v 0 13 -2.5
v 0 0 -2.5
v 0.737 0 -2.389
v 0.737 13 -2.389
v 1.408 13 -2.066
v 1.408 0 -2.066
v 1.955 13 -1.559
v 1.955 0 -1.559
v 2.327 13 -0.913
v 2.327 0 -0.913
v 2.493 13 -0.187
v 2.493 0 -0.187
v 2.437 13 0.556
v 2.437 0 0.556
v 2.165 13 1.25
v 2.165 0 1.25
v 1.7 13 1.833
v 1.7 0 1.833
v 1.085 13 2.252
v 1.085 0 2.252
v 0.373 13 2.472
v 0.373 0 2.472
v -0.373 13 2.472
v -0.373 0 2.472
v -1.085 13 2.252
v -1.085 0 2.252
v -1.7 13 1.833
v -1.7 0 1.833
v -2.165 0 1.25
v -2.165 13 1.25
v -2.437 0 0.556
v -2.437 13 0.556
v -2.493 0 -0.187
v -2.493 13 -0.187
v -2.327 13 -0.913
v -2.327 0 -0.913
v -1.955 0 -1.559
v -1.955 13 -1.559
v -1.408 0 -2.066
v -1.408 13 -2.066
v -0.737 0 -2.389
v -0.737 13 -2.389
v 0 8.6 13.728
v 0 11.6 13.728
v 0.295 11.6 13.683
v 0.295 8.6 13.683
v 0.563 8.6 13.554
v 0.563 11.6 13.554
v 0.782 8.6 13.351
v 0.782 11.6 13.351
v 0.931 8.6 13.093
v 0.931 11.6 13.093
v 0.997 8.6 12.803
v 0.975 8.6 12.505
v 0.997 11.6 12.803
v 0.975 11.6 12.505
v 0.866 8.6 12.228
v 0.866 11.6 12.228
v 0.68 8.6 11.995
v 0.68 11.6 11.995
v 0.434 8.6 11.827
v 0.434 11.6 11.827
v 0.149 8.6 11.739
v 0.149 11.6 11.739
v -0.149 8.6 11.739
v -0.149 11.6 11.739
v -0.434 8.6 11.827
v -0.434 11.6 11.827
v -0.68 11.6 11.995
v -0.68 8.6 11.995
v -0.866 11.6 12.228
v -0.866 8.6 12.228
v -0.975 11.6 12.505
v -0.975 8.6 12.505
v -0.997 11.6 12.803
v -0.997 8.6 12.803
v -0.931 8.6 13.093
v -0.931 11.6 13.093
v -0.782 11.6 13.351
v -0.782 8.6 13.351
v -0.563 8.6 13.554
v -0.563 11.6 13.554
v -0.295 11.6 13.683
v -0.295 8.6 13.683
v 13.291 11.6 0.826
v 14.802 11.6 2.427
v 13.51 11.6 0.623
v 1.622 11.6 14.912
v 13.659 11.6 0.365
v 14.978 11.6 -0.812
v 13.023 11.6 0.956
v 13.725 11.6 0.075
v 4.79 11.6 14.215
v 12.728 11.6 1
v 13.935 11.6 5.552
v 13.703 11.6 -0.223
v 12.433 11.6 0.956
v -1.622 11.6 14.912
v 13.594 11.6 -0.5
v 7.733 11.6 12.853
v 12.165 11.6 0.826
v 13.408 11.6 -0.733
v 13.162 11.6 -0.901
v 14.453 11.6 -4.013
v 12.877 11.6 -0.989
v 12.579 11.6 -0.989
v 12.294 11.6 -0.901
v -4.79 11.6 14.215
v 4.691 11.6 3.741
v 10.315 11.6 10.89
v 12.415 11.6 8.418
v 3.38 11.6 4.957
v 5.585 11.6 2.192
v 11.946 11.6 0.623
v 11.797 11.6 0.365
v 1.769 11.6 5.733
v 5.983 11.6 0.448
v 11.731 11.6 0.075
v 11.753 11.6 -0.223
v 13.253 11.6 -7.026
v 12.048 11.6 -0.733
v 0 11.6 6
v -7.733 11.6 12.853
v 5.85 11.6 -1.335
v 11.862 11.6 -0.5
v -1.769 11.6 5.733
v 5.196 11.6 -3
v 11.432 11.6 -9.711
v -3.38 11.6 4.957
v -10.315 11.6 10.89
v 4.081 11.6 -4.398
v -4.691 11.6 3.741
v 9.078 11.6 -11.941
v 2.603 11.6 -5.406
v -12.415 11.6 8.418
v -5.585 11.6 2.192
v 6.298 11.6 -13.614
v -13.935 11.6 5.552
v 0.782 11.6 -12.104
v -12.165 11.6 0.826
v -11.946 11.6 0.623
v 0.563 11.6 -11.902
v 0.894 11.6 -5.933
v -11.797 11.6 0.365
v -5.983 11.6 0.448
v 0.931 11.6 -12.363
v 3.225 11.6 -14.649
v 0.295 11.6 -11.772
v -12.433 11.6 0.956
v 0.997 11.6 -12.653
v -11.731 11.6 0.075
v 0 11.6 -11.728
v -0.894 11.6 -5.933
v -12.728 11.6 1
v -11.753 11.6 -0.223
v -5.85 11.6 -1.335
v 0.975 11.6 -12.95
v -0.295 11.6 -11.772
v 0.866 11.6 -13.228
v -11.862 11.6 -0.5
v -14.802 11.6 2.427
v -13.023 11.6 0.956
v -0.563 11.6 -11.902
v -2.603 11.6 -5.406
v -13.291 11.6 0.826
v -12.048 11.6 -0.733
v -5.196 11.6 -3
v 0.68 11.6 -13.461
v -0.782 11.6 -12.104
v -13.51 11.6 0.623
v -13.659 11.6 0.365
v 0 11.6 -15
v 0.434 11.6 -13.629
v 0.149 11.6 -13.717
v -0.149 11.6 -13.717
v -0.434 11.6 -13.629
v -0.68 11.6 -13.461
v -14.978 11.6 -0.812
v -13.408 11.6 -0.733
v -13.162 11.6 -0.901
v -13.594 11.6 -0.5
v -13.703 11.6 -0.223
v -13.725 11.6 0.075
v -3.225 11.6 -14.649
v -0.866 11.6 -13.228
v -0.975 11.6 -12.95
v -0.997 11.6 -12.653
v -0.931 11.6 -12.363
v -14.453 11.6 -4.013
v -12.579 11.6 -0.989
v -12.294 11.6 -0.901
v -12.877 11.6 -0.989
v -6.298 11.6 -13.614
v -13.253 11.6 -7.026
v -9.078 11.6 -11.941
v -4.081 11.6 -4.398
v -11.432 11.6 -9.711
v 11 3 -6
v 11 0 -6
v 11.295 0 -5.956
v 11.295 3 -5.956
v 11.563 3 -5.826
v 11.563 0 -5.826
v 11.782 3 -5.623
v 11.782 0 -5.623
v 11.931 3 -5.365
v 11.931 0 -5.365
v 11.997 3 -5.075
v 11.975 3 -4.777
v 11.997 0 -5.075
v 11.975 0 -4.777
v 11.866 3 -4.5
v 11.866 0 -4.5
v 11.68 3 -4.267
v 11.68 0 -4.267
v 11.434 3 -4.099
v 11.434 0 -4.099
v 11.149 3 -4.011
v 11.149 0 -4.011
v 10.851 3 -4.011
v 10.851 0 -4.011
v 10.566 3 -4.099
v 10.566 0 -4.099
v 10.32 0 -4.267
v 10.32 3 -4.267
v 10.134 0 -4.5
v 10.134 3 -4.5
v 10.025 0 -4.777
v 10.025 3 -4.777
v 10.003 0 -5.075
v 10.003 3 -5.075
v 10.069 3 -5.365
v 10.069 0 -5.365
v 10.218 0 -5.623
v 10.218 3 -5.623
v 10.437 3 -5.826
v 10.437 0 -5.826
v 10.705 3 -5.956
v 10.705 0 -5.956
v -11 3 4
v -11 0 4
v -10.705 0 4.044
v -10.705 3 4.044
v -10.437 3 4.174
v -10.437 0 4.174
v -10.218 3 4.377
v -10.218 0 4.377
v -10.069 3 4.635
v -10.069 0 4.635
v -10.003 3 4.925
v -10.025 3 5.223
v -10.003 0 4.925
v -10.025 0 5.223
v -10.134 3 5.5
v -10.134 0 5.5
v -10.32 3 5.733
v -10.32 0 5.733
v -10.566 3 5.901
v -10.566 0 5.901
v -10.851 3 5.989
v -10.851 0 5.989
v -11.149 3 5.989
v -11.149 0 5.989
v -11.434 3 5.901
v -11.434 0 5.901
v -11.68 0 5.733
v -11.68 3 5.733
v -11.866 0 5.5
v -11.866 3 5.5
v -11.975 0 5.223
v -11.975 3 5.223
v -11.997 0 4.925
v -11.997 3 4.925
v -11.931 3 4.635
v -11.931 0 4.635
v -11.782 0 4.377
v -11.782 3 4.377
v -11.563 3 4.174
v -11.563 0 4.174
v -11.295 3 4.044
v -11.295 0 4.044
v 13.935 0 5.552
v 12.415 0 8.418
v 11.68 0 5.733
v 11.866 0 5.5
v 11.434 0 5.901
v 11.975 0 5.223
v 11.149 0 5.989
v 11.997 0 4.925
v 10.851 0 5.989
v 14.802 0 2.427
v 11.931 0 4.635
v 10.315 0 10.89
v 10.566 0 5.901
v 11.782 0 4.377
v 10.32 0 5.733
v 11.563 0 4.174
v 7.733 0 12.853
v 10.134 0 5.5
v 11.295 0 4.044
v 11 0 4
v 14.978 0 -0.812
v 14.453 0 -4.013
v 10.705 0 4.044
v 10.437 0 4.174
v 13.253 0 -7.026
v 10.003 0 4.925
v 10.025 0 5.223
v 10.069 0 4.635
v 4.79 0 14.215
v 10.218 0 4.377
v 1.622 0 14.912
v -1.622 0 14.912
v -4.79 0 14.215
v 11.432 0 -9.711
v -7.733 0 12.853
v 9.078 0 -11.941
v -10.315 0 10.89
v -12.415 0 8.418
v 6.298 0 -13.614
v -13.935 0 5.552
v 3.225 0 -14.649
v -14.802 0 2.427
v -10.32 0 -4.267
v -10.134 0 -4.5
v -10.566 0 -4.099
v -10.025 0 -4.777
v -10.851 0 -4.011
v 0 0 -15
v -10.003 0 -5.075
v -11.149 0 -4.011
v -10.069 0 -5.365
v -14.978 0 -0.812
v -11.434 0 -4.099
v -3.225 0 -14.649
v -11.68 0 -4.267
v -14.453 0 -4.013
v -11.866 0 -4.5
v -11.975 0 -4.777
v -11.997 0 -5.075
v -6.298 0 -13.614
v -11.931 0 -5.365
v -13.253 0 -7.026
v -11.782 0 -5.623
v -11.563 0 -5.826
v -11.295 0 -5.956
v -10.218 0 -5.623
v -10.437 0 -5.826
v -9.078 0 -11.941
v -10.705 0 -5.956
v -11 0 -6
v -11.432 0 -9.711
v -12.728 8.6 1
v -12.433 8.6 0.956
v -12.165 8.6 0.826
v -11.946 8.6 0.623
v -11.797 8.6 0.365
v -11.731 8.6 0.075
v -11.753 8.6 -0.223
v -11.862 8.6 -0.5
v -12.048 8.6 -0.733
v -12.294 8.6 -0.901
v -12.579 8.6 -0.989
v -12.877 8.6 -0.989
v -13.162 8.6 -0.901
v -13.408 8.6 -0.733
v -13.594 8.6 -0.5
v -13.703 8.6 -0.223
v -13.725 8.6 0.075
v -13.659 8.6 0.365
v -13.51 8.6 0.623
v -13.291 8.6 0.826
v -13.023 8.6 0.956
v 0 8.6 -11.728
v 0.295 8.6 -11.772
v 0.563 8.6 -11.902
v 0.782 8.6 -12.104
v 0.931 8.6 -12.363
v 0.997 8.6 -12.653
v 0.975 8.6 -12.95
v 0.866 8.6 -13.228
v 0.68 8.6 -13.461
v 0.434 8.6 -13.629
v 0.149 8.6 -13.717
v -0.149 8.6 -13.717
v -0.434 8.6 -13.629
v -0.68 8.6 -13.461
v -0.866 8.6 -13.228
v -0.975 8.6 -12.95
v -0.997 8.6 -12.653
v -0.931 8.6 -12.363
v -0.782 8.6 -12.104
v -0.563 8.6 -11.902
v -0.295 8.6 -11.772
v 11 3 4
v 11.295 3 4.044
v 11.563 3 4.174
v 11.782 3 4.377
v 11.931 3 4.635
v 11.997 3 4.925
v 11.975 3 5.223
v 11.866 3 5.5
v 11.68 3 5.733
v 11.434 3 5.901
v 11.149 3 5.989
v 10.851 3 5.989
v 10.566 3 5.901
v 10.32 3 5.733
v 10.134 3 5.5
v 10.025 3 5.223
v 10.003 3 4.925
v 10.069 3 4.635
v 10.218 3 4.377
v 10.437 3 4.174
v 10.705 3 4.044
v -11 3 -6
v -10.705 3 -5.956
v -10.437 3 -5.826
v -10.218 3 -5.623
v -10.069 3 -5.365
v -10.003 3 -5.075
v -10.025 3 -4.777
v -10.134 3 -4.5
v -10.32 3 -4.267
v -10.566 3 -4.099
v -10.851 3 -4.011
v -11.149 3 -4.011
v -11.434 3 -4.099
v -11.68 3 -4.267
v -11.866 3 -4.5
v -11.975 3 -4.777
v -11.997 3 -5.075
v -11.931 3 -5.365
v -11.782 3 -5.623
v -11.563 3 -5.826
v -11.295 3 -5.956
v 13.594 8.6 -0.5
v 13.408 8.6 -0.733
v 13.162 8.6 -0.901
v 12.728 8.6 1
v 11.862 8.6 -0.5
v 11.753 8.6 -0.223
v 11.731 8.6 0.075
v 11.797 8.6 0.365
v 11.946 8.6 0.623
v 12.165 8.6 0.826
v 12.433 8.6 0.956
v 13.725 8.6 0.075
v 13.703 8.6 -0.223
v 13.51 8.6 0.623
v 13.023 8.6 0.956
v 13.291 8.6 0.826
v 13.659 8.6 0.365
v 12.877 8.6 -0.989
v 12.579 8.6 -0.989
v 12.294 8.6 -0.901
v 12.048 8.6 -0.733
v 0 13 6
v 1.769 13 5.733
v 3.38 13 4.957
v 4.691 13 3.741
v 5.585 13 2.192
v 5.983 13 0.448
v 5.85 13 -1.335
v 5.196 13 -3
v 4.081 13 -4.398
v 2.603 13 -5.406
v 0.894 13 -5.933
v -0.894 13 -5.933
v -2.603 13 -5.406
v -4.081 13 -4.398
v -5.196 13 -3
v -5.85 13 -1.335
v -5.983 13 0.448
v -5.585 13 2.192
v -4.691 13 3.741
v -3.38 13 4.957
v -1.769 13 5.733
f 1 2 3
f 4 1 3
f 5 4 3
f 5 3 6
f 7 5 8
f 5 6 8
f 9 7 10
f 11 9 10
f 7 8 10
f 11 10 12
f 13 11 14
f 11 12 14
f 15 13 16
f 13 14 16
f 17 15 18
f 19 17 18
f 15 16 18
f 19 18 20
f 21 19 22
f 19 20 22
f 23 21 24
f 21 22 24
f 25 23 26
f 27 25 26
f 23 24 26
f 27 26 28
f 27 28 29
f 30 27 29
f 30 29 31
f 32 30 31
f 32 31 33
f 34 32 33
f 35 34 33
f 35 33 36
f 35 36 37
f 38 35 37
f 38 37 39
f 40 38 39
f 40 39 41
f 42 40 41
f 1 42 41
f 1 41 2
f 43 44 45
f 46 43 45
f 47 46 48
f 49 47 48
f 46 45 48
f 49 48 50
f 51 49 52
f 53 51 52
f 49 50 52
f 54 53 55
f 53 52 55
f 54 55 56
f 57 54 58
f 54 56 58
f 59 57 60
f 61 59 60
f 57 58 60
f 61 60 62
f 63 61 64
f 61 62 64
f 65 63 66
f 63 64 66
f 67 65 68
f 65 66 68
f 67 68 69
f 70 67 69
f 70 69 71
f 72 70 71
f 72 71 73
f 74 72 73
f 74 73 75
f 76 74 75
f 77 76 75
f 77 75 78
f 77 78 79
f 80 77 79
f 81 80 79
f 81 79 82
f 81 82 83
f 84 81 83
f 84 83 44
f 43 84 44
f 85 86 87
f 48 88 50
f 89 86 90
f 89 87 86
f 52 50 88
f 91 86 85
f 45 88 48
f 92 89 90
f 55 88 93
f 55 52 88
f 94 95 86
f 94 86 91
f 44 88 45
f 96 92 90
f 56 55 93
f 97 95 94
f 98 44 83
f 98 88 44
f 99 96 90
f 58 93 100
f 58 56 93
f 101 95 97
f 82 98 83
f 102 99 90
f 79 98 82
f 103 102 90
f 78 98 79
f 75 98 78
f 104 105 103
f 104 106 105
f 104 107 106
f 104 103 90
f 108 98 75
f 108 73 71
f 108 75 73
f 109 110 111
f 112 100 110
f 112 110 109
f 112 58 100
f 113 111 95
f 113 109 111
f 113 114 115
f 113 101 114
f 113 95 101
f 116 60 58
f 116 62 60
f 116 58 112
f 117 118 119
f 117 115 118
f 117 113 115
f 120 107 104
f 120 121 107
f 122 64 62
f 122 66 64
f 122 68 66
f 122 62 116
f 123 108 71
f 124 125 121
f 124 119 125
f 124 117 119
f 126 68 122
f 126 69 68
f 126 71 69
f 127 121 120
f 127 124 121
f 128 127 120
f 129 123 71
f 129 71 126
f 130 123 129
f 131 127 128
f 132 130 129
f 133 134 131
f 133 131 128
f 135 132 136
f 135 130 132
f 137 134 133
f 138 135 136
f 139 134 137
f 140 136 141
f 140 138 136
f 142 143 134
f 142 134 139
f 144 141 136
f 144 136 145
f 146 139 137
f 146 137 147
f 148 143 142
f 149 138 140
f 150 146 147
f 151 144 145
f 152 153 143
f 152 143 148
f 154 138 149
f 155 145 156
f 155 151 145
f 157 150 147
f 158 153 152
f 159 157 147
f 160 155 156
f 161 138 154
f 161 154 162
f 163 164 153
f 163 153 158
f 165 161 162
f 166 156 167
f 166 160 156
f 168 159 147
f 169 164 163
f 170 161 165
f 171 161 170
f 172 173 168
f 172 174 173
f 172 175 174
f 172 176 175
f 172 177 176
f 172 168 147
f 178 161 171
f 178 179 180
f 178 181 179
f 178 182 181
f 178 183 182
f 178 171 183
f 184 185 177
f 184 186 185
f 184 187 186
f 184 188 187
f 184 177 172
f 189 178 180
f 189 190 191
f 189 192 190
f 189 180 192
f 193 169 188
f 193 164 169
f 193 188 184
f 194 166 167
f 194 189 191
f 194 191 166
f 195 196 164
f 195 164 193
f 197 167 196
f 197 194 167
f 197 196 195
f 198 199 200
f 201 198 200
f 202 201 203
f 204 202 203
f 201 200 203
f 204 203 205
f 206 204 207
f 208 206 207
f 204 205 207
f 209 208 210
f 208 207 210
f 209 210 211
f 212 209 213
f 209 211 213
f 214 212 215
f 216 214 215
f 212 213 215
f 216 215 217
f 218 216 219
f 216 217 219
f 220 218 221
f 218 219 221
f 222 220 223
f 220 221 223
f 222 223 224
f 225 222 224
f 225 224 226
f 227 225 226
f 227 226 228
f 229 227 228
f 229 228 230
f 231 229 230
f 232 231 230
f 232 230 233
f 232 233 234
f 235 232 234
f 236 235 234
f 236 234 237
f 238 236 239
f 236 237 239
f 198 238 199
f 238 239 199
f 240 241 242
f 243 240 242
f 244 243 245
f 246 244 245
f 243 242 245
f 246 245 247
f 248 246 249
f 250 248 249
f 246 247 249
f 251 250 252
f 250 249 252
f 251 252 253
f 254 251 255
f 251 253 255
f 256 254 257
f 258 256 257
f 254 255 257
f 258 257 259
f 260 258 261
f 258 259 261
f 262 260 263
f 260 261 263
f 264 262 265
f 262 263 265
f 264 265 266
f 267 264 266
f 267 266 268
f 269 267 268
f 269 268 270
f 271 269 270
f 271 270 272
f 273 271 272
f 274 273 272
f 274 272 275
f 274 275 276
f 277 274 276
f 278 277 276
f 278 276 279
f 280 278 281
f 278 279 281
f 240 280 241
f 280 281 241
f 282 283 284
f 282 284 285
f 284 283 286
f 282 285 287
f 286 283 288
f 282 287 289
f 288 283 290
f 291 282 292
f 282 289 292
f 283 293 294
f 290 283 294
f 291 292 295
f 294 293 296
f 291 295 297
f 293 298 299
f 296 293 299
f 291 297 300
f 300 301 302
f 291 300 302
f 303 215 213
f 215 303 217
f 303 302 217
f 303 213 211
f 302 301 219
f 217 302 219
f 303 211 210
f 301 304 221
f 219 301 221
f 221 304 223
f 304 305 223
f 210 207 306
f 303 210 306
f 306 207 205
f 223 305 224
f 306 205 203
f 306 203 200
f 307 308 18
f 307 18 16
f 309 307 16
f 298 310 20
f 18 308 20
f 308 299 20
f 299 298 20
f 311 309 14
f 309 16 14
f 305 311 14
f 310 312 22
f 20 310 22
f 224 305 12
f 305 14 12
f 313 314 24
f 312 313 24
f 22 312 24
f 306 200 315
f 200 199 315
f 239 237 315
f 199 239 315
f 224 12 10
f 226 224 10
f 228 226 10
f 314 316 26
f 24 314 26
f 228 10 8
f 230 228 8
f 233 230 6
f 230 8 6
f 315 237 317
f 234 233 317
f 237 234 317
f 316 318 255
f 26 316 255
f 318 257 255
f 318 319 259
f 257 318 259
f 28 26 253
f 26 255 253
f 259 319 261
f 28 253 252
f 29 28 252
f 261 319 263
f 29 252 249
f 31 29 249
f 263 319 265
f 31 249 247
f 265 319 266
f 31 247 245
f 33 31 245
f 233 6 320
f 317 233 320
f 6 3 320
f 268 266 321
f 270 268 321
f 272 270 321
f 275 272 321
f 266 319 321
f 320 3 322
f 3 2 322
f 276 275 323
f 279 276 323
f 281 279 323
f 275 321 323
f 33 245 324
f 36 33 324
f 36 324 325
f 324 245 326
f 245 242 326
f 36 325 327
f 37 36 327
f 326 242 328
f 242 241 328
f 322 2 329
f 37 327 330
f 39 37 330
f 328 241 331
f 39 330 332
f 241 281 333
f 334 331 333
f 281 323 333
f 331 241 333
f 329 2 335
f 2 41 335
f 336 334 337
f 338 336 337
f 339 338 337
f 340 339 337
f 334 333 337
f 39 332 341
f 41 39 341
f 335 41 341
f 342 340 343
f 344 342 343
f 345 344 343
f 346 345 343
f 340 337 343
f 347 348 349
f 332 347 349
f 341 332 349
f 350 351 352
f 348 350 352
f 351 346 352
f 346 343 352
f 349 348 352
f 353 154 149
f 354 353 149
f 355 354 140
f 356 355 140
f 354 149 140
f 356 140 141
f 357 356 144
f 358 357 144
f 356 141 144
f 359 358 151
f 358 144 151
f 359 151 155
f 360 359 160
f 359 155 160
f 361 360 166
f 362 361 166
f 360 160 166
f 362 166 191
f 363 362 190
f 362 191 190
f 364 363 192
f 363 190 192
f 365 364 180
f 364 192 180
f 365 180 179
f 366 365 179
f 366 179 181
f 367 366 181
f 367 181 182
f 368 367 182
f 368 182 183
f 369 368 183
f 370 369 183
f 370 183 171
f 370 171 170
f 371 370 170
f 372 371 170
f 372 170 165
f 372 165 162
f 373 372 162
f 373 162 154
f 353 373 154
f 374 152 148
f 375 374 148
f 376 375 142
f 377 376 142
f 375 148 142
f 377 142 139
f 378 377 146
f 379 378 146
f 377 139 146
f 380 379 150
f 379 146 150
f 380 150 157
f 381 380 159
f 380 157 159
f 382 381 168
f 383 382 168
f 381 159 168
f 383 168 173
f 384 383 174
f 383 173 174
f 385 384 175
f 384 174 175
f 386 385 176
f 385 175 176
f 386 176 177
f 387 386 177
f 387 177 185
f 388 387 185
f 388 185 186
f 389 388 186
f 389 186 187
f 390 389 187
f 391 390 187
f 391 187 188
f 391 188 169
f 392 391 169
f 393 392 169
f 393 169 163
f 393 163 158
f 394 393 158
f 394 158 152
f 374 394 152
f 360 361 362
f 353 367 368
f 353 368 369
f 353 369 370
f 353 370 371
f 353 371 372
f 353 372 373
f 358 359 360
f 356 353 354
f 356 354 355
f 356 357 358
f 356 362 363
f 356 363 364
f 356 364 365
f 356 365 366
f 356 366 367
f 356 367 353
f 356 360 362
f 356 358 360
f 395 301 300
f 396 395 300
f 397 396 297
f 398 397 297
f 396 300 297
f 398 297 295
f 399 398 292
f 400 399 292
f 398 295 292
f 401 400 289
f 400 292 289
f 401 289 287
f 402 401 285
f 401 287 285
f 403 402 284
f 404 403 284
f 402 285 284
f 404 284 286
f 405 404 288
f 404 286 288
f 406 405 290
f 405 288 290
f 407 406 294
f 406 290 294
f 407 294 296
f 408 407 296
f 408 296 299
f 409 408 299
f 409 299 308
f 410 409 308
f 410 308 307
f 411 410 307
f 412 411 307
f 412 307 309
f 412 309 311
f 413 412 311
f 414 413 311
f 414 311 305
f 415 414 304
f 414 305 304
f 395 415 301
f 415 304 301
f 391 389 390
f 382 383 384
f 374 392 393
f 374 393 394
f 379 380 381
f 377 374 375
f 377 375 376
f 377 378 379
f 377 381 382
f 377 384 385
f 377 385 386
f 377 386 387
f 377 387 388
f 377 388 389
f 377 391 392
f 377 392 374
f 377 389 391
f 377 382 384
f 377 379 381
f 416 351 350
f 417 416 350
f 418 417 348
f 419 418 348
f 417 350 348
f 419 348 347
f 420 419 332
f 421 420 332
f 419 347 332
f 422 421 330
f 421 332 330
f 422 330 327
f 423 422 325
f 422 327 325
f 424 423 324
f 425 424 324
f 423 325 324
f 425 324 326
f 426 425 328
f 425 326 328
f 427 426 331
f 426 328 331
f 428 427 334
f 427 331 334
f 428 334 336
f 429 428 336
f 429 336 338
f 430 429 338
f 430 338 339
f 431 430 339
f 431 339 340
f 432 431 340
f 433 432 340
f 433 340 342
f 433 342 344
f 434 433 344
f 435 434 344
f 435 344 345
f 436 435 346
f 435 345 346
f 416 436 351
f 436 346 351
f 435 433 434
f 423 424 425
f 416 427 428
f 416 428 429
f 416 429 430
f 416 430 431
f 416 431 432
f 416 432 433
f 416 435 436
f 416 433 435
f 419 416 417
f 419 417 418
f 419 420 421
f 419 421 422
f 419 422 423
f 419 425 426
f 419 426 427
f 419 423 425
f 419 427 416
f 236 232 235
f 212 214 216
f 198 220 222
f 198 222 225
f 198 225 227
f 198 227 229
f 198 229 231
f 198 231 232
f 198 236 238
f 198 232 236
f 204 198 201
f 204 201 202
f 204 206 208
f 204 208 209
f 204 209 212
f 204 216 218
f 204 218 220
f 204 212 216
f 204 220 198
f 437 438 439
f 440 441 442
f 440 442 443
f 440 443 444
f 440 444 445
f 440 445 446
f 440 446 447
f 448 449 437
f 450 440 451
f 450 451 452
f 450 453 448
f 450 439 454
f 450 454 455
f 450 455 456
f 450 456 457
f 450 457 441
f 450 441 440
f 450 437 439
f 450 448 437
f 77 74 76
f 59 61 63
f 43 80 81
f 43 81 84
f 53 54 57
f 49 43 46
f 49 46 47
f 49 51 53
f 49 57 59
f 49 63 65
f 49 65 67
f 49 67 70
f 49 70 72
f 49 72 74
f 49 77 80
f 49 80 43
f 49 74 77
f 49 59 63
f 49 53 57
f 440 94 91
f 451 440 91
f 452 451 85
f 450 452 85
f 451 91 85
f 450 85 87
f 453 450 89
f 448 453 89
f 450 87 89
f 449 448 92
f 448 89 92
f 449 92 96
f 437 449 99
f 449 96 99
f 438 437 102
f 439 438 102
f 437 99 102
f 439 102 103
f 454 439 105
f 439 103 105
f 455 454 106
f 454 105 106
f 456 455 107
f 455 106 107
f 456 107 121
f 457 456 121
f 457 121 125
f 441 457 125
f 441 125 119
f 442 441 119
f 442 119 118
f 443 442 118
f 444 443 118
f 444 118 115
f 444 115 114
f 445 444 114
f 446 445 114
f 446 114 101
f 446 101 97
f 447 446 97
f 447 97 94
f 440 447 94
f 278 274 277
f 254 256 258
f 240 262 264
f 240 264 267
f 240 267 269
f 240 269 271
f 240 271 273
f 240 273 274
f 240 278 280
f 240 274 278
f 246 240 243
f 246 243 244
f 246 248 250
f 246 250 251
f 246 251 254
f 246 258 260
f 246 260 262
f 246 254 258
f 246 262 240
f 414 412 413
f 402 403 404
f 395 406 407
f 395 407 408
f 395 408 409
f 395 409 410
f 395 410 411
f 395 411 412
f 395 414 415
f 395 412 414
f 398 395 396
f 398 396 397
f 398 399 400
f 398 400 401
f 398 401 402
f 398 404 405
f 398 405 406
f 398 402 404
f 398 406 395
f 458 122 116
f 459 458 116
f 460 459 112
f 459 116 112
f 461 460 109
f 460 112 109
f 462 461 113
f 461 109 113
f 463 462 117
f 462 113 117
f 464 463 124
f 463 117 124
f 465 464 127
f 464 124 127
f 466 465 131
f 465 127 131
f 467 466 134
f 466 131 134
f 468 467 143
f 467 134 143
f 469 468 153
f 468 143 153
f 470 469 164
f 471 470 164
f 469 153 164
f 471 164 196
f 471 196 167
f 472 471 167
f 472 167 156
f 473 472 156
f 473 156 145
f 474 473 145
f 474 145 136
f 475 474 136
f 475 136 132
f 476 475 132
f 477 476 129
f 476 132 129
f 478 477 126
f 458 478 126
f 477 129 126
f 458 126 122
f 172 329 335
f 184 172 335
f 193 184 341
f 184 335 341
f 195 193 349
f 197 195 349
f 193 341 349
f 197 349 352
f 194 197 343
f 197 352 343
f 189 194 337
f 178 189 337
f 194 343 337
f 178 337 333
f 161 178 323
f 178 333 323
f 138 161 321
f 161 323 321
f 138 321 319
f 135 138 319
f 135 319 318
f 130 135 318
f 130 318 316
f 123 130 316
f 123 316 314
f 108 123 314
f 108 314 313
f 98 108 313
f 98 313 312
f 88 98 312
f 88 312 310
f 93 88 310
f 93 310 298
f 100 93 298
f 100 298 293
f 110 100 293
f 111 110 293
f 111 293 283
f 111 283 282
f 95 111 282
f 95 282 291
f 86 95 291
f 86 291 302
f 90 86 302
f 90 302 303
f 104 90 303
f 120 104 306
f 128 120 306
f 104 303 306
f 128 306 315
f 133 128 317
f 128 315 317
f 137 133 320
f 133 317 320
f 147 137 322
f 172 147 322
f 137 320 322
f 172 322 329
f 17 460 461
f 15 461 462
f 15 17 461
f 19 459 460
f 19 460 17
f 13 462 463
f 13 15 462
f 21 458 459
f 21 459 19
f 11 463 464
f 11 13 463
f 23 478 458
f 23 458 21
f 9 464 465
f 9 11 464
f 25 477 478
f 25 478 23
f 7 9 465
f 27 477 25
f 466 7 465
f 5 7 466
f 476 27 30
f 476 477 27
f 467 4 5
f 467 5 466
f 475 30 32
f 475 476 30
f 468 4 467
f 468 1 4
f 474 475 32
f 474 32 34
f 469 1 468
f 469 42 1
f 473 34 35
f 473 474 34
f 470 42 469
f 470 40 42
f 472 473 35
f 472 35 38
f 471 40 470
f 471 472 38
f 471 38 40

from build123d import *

# Parameters (mm, degrees)
SKETCH1_R      = 15
EXTRUDE1_DEPTH = 13
EXTRUDE2_START = -1.4
SKETCH2_R      = 15
SKETCH2_R_2    = 6
EXTRUDE2_DEPTH = 1.4
SKETCH3_R      = 1
EXTRUDE3_DEPTH = 4.4
SKETCH5_R      = 1
EXTRUDE5_DEPTH = 3
SKETCH6_R      = 2.5
EXTRUDE6_DEPTH = 25.879710609


with BuildPart() as part:
    # Sketch1 → Extrude1 (new body)
    with BuildSketch(Plane(origin=(0, 0, 0), x_dir=(1, 0, 0), z_dir=(0, 1, 0))):
        Circle(SKETCH1_R)
    extrude(amount=EXTRUDE1_DEPTH)

    # Sketch2 → Extrude2 (cut)
    with BuildSketch(Plane(origin=(0, 13, 0), x_dir=(1, 0, 0), z_dir=(0, 1, 0)).offset(EXTRUDE2_START)):
        Circle(SKETCH2_R)
        Circle(SKETCH2_R_2, mode=Mode.SUBTRACT)
    extrude(amount=EXTRUDE2_DEPTH, mode=Mode.SUBTRACT)

    # Sketch3 → Extrude3 (cut)
    with BuildSketch(Plane(origin=(0, 13, 0), x_dir=(1, 0, 0), z_dir=(0, 1, 0))):
        with Locations((0, 12.7279)):
            Circle(SKETCH3_R)
        with Locations((12.7279, 0)):
            Circle(SKETCH3_R)
        with Locations((0, -12.7279)):
            Circle(SKETCH3_R)
        with Locations((-12.7279, 0)):
            Circle(SKETCH3_R)
    extrude(amount=-EXTRUDE3_DEPTH, mode=Mode.SUBTRACT)

    # Sketch5 → Extrude5 (cut)
    with BuildSketch(Plane.XZ):
        with Locations((-11, 5)):
            Circle(SKETCH5_R)
        with Locations((11, 5)):
            Circle(SKETCH5_R)
        with Locations((11, -5)):
            Circle(SKETCH5_R)
        with Locations((-11, -5)):
            Circle(SKETCH5_R)
    extrude(amount=-EXTRUDE5_DEPTH, mode=Mode.SUBTRACT)

    # Sketch6 → Extrude6 (cut, through all)
    with BuildSketch(Plane.XZ):
        Circle(SKETCH6_R)
    extrude(amount=-EXTRUDE6_DEPTH, mode=Mode.SUBTRACT)


solid = part.part
